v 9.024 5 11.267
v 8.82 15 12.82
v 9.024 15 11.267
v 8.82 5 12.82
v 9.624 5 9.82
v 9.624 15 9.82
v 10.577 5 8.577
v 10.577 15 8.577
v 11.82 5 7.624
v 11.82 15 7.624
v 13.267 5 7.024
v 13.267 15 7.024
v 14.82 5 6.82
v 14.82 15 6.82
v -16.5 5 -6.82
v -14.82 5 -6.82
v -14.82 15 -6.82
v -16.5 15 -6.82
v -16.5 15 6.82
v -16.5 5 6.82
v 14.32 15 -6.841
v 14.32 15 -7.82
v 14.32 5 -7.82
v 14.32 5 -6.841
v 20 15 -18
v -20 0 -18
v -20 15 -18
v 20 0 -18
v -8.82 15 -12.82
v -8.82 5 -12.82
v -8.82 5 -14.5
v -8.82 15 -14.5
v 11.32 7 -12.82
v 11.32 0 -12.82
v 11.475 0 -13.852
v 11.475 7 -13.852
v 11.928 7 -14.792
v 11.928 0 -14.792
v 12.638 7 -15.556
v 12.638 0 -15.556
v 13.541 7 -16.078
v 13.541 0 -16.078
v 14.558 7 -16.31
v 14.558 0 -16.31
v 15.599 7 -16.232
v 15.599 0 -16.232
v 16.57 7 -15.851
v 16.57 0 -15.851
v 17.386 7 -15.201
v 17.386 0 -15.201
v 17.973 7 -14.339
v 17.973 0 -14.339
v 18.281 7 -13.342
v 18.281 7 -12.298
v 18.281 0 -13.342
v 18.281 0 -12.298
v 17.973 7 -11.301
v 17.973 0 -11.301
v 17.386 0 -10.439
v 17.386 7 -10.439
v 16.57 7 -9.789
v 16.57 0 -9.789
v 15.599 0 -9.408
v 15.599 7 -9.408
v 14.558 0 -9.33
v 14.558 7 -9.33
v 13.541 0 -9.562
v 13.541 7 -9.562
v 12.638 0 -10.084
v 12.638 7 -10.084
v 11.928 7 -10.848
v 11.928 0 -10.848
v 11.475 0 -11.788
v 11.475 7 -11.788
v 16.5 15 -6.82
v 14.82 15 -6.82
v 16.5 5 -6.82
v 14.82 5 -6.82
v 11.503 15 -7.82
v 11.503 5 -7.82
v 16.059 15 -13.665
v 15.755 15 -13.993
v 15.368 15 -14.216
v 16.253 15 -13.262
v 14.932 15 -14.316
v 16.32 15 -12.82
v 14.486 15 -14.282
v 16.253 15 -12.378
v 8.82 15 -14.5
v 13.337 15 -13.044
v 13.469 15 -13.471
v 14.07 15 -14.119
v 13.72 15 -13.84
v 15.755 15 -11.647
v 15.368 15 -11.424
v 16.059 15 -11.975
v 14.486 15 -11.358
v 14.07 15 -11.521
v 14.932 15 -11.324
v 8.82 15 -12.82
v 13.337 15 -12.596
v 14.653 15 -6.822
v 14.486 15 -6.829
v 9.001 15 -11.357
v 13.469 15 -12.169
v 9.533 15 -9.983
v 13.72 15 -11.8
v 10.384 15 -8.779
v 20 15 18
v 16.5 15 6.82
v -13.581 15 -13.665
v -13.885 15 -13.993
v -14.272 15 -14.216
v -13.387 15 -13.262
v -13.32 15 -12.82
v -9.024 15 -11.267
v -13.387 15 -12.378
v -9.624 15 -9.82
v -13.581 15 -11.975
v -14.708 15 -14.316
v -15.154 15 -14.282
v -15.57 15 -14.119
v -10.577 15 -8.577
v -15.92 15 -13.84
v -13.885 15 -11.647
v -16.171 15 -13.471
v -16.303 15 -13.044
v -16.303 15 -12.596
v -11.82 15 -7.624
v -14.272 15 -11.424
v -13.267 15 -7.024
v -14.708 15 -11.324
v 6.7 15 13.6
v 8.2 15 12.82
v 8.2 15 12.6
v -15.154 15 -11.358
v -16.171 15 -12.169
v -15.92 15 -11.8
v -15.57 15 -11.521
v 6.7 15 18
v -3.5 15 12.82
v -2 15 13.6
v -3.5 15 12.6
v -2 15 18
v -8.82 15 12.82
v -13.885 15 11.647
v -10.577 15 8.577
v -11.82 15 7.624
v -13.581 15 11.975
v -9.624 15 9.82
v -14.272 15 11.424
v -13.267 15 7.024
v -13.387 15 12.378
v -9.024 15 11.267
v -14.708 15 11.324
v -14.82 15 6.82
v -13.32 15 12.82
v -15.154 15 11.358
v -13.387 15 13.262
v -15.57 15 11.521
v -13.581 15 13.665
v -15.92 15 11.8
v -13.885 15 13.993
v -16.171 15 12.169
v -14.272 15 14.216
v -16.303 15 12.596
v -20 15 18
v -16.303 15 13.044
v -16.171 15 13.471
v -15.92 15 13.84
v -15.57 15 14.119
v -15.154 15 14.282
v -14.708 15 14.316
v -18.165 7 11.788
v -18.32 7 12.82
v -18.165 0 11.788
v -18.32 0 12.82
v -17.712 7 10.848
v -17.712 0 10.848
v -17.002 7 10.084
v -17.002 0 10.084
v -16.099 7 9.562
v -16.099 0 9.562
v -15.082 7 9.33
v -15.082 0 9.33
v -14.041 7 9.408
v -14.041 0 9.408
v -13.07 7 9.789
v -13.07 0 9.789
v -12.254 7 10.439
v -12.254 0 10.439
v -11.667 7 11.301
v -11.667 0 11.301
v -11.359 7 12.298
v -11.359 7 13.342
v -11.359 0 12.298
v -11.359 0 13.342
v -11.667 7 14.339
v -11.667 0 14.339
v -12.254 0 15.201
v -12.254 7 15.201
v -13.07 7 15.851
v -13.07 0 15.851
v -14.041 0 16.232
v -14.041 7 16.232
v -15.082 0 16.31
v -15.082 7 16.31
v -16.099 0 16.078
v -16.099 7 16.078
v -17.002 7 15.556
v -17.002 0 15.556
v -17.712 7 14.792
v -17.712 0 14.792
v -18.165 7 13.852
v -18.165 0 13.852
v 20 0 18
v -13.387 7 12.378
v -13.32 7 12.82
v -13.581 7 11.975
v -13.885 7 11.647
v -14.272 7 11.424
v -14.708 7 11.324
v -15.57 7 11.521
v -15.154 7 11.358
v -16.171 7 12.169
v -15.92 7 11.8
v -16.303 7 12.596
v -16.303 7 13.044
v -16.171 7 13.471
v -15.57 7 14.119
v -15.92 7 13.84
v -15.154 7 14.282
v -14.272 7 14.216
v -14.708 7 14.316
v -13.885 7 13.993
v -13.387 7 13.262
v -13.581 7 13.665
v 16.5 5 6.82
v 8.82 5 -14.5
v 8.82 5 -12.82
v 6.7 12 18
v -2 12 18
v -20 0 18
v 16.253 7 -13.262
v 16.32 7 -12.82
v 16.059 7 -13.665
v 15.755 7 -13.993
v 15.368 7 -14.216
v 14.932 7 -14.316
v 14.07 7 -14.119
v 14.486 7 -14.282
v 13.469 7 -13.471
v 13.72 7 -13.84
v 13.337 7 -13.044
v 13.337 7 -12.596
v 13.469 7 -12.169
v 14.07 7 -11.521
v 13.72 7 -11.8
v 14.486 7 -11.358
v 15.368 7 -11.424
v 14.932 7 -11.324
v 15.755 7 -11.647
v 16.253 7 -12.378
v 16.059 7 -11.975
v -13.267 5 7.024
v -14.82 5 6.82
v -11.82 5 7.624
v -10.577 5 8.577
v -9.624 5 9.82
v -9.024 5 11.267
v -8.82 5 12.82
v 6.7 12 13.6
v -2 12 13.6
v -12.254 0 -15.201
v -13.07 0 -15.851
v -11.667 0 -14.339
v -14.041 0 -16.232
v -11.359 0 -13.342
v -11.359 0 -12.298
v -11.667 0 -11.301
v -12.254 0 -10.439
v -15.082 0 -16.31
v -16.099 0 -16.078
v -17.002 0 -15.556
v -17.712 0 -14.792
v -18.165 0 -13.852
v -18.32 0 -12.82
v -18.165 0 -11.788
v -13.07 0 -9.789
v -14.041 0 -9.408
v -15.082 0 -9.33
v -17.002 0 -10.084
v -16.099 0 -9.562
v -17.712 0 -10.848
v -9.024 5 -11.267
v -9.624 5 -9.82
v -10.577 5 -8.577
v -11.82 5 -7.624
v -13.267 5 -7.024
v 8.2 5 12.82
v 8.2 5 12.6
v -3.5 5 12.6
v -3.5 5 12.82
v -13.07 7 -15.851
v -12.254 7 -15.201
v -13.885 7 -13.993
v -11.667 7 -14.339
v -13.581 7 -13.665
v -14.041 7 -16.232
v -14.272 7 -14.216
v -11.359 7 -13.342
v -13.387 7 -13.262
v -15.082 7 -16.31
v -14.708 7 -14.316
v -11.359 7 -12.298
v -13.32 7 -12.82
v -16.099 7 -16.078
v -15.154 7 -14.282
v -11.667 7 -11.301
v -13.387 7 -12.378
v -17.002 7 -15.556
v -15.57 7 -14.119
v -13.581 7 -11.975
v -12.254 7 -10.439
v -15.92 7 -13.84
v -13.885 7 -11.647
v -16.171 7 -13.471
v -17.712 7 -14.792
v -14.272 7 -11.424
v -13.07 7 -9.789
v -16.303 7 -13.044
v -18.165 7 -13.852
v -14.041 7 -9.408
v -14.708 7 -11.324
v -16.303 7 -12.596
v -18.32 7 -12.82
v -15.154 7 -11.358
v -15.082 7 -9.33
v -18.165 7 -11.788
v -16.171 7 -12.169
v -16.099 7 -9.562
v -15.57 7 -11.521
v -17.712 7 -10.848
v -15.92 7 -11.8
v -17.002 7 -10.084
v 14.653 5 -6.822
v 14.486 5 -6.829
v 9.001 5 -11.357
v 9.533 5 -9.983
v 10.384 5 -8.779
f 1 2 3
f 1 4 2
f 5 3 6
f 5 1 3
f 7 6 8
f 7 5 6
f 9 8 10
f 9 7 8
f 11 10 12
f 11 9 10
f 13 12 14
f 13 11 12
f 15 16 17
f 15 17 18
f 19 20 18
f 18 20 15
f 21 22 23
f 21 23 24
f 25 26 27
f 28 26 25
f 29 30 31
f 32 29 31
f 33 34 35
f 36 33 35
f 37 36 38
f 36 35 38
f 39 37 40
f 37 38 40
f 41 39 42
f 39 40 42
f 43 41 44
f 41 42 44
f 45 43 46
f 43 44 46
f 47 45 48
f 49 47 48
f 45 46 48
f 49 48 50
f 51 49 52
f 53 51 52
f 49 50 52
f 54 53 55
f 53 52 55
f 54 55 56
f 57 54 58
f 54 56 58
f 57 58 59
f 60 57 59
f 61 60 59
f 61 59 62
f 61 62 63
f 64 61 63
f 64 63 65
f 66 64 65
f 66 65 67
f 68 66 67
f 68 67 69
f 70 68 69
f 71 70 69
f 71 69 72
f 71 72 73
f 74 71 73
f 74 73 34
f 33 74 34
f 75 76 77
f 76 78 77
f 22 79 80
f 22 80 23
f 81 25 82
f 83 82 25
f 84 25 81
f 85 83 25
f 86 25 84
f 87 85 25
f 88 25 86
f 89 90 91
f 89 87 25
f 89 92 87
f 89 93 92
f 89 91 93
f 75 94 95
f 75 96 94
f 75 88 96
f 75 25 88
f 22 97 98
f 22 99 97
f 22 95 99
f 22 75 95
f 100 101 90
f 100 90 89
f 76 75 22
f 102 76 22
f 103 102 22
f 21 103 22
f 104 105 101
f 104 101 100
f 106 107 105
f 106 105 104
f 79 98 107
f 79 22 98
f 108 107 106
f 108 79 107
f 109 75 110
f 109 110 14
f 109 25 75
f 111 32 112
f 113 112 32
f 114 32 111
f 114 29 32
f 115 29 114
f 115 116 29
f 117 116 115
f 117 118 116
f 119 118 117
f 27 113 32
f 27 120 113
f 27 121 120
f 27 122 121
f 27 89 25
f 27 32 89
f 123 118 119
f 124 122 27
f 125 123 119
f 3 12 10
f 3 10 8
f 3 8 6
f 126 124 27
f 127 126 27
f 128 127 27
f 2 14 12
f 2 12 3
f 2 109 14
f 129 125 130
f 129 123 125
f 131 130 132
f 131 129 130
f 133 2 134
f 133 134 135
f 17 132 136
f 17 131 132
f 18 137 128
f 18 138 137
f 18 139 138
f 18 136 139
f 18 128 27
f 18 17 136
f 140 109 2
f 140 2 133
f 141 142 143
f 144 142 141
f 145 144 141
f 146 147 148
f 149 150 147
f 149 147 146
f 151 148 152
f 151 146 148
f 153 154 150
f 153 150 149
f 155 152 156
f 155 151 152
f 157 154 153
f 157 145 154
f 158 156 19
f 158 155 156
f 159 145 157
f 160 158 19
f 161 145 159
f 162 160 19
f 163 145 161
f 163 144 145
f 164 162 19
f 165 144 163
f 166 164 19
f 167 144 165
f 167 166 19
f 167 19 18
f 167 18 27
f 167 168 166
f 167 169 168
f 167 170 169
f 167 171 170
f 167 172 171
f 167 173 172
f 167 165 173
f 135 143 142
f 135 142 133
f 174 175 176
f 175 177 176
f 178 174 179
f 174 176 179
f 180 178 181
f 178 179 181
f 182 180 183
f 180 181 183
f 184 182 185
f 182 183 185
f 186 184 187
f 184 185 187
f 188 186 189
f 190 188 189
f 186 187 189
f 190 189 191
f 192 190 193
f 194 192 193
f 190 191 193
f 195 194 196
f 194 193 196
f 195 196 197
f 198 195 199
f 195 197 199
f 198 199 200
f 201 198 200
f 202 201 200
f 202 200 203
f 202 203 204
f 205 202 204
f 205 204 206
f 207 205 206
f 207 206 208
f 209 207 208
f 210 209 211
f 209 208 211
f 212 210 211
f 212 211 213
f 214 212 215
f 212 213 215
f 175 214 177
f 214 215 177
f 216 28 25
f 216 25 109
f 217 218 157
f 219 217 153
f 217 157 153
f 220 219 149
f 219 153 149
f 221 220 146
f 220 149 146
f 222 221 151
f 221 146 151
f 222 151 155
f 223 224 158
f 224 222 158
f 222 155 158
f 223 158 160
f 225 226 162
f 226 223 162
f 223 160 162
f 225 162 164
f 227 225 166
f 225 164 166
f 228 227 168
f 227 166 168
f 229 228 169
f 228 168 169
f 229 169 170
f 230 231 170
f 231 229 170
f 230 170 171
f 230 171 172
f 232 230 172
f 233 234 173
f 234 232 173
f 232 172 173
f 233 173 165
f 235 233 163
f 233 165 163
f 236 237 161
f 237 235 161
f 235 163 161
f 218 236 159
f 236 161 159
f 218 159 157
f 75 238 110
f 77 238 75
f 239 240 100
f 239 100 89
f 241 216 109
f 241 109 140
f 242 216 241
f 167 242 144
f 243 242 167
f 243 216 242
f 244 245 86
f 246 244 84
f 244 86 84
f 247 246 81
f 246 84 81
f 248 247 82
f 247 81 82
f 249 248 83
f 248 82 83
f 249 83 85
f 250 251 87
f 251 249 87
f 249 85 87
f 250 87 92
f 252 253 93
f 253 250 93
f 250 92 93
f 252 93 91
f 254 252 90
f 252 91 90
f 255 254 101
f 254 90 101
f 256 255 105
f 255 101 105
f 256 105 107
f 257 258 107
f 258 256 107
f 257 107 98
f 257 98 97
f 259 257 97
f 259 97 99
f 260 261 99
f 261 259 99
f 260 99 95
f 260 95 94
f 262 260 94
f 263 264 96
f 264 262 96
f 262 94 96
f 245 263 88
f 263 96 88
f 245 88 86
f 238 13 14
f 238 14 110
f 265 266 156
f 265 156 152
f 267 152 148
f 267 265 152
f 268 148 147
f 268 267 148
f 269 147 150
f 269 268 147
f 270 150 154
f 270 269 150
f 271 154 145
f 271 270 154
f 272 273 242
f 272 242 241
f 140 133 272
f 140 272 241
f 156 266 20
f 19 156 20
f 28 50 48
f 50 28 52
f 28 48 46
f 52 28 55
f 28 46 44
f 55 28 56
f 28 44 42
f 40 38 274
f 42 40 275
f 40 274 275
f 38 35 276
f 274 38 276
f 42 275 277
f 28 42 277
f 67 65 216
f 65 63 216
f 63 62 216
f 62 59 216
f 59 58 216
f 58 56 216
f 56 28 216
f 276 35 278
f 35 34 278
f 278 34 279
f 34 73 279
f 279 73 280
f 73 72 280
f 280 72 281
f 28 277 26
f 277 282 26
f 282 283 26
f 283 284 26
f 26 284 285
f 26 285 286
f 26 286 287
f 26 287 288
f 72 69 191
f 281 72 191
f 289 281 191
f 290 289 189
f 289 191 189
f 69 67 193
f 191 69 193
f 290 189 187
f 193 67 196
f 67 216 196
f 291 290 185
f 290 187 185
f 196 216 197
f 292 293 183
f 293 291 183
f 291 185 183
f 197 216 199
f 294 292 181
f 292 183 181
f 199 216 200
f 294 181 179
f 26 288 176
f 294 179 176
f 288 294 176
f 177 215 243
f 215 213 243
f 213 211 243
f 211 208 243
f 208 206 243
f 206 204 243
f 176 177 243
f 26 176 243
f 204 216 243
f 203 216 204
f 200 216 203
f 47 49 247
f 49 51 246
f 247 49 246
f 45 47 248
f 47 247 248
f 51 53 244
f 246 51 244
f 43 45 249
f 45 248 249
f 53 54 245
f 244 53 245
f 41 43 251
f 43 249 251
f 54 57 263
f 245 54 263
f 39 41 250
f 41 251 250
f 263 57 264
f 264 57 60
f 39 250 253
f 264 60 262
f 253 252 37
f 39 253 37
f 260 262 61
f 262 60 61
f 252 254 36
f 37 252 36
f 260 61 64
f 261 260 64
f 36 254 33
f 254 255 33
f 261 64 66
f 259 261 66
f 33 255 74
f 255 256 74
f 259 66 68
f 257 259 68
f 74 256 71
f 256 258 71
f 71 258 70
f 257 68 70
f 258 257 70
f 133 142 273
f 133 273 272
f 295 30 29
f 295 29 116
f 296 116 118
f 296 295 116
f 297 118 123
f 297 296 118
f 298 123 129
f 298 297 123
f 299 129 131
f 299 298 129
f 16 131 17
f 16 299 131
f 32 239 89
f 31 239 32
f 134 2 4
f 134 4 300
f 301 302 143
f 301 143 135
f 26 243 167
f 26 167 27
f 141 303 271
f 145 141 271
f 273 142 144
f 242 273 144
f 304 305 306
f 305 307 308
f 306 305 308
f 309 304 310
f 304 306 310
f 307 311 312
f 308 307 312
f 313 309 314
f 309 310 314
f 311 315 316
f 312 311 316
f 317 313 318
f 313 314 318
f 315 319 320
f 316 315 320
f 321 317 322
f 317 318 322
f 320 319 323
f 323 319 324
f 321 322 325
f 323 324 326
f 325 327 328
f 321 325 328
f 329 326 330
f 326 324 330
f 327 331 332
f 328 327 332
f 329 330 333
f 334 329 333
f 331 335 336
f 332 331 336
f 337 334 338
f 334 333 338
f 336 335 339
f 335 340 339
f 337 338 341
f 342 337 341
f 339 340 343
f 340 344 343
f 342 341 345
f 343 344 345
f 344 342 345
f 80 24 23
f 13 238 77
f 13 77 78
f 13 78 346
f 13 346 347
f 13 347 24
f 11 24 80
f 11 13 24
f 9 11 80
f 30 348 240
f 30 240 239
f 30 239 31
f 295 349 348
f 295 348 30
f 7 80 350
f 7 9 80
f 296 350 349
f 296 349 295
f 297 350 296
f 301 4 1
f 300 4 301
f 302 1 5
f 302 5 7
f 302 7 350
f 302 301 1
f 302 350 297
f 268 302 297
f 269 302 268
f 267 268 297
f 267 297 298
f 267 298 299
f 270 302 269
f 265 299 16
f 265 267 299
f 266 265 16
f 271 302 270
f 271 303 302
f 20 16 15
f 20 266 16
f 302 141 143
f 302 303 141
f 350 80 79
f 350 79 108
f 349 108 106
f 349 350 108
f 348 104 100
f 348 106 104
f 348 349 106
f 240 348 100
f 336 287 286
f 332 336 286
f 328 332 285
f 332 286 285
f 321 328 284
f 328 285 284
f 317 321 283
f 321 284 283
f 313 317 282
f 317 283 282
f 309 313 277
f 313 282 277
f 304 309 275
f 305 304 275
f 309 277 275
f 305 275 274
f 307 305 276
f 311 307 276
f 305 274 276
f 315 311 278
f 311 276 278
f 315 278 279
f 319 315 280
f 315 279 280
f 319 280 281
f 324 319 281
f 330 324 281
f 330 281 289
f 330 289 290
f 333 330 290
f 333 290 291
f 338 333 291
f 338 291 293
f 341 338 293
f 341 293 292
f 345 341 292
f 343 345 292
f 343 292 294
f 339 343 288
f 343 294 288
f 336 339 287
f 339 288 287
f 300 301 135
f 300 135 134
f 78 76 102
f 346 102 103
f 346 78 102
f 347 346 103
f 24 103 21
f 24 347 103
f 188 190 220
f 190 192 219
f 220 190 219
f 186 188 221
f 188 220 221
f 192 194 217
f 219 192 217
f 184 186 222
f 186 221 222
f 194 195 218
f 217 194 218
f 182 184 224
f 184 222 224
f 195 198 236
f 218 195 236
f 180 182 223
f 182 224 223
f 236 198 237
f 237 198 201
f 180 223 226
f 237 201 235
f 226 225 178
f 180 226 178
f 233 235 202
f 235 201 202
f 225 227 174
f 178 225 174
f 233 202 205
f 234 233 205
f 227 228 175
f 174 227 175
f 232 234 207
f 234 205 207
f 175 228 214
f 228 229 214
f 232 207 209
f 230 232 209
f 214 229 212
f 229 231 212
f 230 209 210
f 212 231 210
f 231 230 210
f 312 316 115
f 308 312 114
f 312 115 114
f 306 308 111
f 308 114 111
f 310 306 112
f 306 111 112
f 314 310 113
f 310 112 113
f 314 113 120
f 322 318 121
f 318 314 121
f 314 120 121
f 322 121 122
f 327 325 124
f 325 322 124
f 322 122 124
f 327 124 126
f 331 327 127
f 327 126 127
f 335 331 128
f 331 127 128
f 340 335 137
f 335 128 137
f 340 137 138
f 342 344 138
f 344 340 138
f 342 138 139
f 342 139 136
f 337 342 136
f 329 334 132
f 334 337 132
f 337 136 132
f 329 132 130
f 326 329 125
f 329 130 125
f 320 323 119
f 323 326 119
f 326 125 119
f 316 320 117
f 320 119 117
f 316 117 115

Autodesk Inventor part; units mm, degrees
ref_plane "YZ Plane" through (0, 0, 0) normal (1, 0, 0) x (0, 1, 0)
ref_plane "XZ Plane" through (0, 0, 0) normal (0, 1, 0) x (-1, 0, 0)
ref_plane "XY Plane" through (0, 0, 0) normal (0, 0, 1) x (1, 0, 0)
sketch "Эскиз1" plane through (0, 0, 0) normal (0, 1, 0) x (-1, 0, 0)
  line L0 (18, -16) -> (-18, -16)
  line L1 (-18, -16) -> (-18, 16)
  line L2 (-18, 16) -> (18, 16)
  line L3 (18, 16) -> (18, -16)
  line L4 (0, -25.2) -> (0, 25.2) projected
  line L5 (28, 0) -> (-28, 0) projected
  line L6 (14.82, -12.82) -> (-14.82, -12.82)
  line L7 (-14.82, -12.82) -> (-14.82, 12.82)
  line L8 (-14.82, 12.82) -> (14.82, 12.82)
  line L9 (14.82, 12.82) -> (14.82, -12.82)
  circle A0 centre (14.82, -12.82) radius 1.5
  circle A1 centre (14.82, 12.82) radius 1.5
  circle A2 centre (-14.82, 12.82) radius 1.5
  circle A3 centre (-14.82, -12.82) radius 1.5
  arc A4 (14.82, -6.82) -> (8.82, -12.82) centre (14.82, -12.82) ccw
  arc A5 (-8.82, -12.82) -> (-14.82, -6.82) centre (-14.82, -12.82) ccw
  arc A6 (8.82, 12.82) -> (14.82, 6.82) centre (14.82, 12.82) ccw
  arc A7 (-14.82, 6.82) -> (-8.82, 12.82) centre (-14.82, 12.82) ccw
  line L10 (20, -18) -> (-20, -18)
  line L11 (-20, -18) -> (-20, 18)
  line L12 (-20, 18) -> (20, 18)
  line L13 (20, 18) -> (20, -18)
  line L14 (-8.82, -12.82) -> (-8.82, -16)
  line L15 (8.82, -12.82) -> (8.82, -16)
  line L16 (14.82, -6.82) -> (18, -6.82)
  line L17 (14.82, 6.82) -> (18, 6.82)
  line L18 (8.82, 12.82) -> (8.82, 16)
  line L19 (-14.82, -6.82) -> (-20, -6.82)
  line L20 (-14.82, 6.82) -> (-20, 6.82)
  line L21 (-8.82, 12.82) -> (-8.82, 18)
  line L22 (-18, -6.82) -> (-18, 6.82)
  line L23 (8.82, 16) -> (-8.82, 16)
  line L24 (2, 13.6) -> (-6.7, 13.6)
  line L25 (-6.7, 13.6) -> (-6.7, 18)
  line L26 (3.5, 16) -> (3.5, 12.6)
  line L27 (3.5, 12.6) -> (-8.2, 12.6)
  line L28 (-8.2, 12.6) -> (-8.2, 16)
  line L29 (2, 13.6) -> (2, 18)
  circle A8 centre (-14.82, -12.82) radius 3.5
  circle A9 centre (14.82, -12.82) radius 3.5
  circle A10 centre (14.82, 12.82) radius 3.5
  circle A11 centre (-14.82, 12.82) radius 4
  line L30 (18, 6.82) -> (16.5, 6.82)
  line L31 (16.5, 6.82) -> (16.5, -6.82)
  line L32 (16.5, -6.82) -> (18, -6.82)
  line L33 (18, -6.82) -> (18, 6.82)
  line L34 (8.82, 16) -> (3.5, 16)
  line L35 (3.5, 16) -> (3.5, 14.5)
  line L36 (3.5, 14.5) -> (8.82, 14.5)
  line L37 (8.82, 14.5) -> (8.82, 16)
  line L38 (-8.2, 16) -> (-8.82, 16)
  line L39 (-8.82, 16) -> (-8.82, 14.5)
  line L40 (-8.82, 14.5) -> (-8.2, 14.5)
  line L41 (-8.2, 14.5) -> (-8.2, 16)
  line L42 (-18, 6.82) -> (-16.5, 6.82)
  line L43 (-16.5, 6.82) -> (-16.5, -6.82)
  line L44 (-16.5, -6.82) -> (-18, -6.82)
  line L45 (-18, -6.82) -> (-18, 6.82)
  line L46 (8.82, -16) -> (-8.82, -16)
  line L47 (-8.82, -16) -> (-8.82, -14.41)
  line L48 (8.82, -14.41) -> (8.82, -16)
  line L49 (8.82, -16) -> (-8.82, -16)
  line L50 (-8.82, -16) -> (-8.82, -14.5)
  line L51 (-8.82, -14.5) -> (8.82, -14.5)
  line L52 (8.82, -14.5) -> (8.82, -16)
  line L53 (-11.5034, -7.82) -> (-14.32, -7.82)
  line L54 (-14.32, -7.82) -> (-14.32, -6.8409)
  point P0 (0, 0)
  point P1 (-13.034, 10.913)
  dimension "d0" = 36
  dimension "d1" = 32
  dimension "d2" = 3.18
  dimension "d3" = 3.18
  dimension "d4" = 3.18
  dimension "d5" = 3.18
  dimension "d6" = 3
  dimension "d7" = 3
  dimension "d8" = 3
  dimension "d9" = 3
  dimension "d10" = 12
  dimension "d11" = 12
  dimension "d12" = 12
  dimension "d13" = 12
  dimension "d22" = 4.966
  dimension "d23" = 5.087
  dimension "d26" = 2
  dimension "d27" = 2
  dimension "d28" = 2
  dimension "d29" = 2
  dimension "d40" = 11.3
  dimension "d41" = 2.4
  dimension "d43" = 1
  dimension "d44" = 1.5
  dimension "d45" = 1.5
  dimension "d46" = 16
  dimension "d49" = 7
  dimension "d50" = 7
  dimension "d51" = 7
  dimension "d52" = 8
  dimension "d63" = 1.5
  dimension "d64" = 1.5
  dimension "d65" = 1.5
  dimension "d66" = 1.5
  dimension "d67" = 1.5
  dimension "d68" = 0.5
  dimension "d69" = 5
extrude "Выдавливание1" add sketch "Эскиз1" along normal blind 15 contours L3 A9 L5 L13 L10 L4 L0 | L0 A9 L3 | A9 L0 | L0 A9 L6 A0 L9 L3 | L3 A9 | L0 L15 L6 A9 | A9 L9 L16 L3 | L0 L4 L51 L15 | A9 L9 A0 L6 | L6 A4 L9 A9 | L16 L31 L5 L3 | L4 L10 L11 L19 L1 A8 L0 | L0 L14 L51 L4 | A0 L9 L6 | L6 L9 A0 | L5 L31 L17 L3 | L3 A10 L2 L29 L12 L13 L5 | L0 A8 L6 L14 | L17 L9 A10 L3 | A8 L0 | L0 A8 L1 L7 A3 L6 | L6 A8 L7 A5 L54 L53 | A10 L9 A1 L8 L2 L3 | L3 A10 | A6 L8 A10 L9 | L0 L1 A8 | L6 A3 L7 A8 | L11 L5 L1 L19 | L27 L28 L8 L4 | L4 L8 L26 L27 | L53 L54 A5 | A10 L2 L3 | A10 L8 A1 L9 | L29 L2 L4 L12 | L18 L2 A10 L8 | L8 L26 L36 L18 | A8 L1 | A3 L7 L6 | L6 L7 A3 | A8 L1 L19 L7 | L11 L20 L1 L5 | L1 L5 L43 L19 | L8 L28 L2 L25 L24 L4 | L4 L24 L29 L2 L26 L8 | L5 L1 L20 L43 | L20 L1 A11 L7 | L7 A11 L8 A7 | L2 A10 | A1 L8 L9 | L9 L8 A1 | L4 L2 L25 L12 | L29 L24 L4 L2 | L36 L26 L2 L18 | L11 L12 L21 L2 A11 L1 L20 | L24 L25 L2 L4 | L8 L21 L40 L28 | A11 L1 L2 L8 A2 L7 | L7 A2 L8 A11 | L8 A11 L2 L21 | L25 L2 L21 L12 | L40 L21 L2 L28 | A2 L8 L7 | L7 L8 A2 | A11 L1 | L1 L2 A11 | L2 A11
extrude "Выдавливание2" add sketch "Эскиз1" along normal blind 5
sketch "Эскиз2" plane through (0, 15, 0) normal (0, 1, 0) x (1, 0, 0)
  circle A0 centre (-14.82, -12.82) radius 1.5 projected
  circle A1 centre (14.82, -12.82) radius 1.5 projected
  circle A2 centre (14.82, 12.82) radius 1.5 projected
  circle A3 centre (-14.82, 12.82) radius 1.5 projected
  point P0 (0, 0)
extrude "Выдавливание3" cut sketch "Эскиз2" against normal up to next contours A0 | A2 | A3
extrude "Выдавливание5" cut sketch "Эскиз1" along normal blind 7 contours A9 L0 | L0 A9 L6 A0 L9 L3 | L3 A9 | A9 L9 A0 L6 | A8 L0 | L0 A8 L1 L7 A3 L6 | A10 L9 A1 L8 L2 L3 | L3 A10 | L6 A3 L7 A8 | A10 L8 A1 L9 | A8 L1 | L2 A10
sketch "Эскиз3" plane through (0, 15, 0) normal (0, 1, 0) x (1, 0, 0)
  line L0 (-20, -18) -> (20, -18) projected
  line L1 (-2, -13.6) -> (-2, -18) projected
  line L2 (-2, -13.6) -> (6.7, -13.6) projected
  line L3 (6.7, -13.6) -> (6.7, -18) projected
  point P0 (0, 0)
extrude "Выдавливание6" cut sketch "Эскиз3" against normal blind 3
sketch "Эскиз4" plane through (0, 15, 0) normal (0, 1, 0) x (1, 0, 0)
  line L0 (11.5034, 7.82) -> (14.32, 7.82) projected
  line L1 (14.32, 7.82) -> (14.32, 6.8409) projected
  arc A0 (8.82, 12.82) -> (14.82, 6.82) centre (14.82, 12.82) ccw projected
  point P0 (0, 0)
extrude "Выдавливание7" cut sketch "Эскиз4" against normal up to surface (10 mm away)
properties part number "case_top" material "Polycarbonate, Clear"
